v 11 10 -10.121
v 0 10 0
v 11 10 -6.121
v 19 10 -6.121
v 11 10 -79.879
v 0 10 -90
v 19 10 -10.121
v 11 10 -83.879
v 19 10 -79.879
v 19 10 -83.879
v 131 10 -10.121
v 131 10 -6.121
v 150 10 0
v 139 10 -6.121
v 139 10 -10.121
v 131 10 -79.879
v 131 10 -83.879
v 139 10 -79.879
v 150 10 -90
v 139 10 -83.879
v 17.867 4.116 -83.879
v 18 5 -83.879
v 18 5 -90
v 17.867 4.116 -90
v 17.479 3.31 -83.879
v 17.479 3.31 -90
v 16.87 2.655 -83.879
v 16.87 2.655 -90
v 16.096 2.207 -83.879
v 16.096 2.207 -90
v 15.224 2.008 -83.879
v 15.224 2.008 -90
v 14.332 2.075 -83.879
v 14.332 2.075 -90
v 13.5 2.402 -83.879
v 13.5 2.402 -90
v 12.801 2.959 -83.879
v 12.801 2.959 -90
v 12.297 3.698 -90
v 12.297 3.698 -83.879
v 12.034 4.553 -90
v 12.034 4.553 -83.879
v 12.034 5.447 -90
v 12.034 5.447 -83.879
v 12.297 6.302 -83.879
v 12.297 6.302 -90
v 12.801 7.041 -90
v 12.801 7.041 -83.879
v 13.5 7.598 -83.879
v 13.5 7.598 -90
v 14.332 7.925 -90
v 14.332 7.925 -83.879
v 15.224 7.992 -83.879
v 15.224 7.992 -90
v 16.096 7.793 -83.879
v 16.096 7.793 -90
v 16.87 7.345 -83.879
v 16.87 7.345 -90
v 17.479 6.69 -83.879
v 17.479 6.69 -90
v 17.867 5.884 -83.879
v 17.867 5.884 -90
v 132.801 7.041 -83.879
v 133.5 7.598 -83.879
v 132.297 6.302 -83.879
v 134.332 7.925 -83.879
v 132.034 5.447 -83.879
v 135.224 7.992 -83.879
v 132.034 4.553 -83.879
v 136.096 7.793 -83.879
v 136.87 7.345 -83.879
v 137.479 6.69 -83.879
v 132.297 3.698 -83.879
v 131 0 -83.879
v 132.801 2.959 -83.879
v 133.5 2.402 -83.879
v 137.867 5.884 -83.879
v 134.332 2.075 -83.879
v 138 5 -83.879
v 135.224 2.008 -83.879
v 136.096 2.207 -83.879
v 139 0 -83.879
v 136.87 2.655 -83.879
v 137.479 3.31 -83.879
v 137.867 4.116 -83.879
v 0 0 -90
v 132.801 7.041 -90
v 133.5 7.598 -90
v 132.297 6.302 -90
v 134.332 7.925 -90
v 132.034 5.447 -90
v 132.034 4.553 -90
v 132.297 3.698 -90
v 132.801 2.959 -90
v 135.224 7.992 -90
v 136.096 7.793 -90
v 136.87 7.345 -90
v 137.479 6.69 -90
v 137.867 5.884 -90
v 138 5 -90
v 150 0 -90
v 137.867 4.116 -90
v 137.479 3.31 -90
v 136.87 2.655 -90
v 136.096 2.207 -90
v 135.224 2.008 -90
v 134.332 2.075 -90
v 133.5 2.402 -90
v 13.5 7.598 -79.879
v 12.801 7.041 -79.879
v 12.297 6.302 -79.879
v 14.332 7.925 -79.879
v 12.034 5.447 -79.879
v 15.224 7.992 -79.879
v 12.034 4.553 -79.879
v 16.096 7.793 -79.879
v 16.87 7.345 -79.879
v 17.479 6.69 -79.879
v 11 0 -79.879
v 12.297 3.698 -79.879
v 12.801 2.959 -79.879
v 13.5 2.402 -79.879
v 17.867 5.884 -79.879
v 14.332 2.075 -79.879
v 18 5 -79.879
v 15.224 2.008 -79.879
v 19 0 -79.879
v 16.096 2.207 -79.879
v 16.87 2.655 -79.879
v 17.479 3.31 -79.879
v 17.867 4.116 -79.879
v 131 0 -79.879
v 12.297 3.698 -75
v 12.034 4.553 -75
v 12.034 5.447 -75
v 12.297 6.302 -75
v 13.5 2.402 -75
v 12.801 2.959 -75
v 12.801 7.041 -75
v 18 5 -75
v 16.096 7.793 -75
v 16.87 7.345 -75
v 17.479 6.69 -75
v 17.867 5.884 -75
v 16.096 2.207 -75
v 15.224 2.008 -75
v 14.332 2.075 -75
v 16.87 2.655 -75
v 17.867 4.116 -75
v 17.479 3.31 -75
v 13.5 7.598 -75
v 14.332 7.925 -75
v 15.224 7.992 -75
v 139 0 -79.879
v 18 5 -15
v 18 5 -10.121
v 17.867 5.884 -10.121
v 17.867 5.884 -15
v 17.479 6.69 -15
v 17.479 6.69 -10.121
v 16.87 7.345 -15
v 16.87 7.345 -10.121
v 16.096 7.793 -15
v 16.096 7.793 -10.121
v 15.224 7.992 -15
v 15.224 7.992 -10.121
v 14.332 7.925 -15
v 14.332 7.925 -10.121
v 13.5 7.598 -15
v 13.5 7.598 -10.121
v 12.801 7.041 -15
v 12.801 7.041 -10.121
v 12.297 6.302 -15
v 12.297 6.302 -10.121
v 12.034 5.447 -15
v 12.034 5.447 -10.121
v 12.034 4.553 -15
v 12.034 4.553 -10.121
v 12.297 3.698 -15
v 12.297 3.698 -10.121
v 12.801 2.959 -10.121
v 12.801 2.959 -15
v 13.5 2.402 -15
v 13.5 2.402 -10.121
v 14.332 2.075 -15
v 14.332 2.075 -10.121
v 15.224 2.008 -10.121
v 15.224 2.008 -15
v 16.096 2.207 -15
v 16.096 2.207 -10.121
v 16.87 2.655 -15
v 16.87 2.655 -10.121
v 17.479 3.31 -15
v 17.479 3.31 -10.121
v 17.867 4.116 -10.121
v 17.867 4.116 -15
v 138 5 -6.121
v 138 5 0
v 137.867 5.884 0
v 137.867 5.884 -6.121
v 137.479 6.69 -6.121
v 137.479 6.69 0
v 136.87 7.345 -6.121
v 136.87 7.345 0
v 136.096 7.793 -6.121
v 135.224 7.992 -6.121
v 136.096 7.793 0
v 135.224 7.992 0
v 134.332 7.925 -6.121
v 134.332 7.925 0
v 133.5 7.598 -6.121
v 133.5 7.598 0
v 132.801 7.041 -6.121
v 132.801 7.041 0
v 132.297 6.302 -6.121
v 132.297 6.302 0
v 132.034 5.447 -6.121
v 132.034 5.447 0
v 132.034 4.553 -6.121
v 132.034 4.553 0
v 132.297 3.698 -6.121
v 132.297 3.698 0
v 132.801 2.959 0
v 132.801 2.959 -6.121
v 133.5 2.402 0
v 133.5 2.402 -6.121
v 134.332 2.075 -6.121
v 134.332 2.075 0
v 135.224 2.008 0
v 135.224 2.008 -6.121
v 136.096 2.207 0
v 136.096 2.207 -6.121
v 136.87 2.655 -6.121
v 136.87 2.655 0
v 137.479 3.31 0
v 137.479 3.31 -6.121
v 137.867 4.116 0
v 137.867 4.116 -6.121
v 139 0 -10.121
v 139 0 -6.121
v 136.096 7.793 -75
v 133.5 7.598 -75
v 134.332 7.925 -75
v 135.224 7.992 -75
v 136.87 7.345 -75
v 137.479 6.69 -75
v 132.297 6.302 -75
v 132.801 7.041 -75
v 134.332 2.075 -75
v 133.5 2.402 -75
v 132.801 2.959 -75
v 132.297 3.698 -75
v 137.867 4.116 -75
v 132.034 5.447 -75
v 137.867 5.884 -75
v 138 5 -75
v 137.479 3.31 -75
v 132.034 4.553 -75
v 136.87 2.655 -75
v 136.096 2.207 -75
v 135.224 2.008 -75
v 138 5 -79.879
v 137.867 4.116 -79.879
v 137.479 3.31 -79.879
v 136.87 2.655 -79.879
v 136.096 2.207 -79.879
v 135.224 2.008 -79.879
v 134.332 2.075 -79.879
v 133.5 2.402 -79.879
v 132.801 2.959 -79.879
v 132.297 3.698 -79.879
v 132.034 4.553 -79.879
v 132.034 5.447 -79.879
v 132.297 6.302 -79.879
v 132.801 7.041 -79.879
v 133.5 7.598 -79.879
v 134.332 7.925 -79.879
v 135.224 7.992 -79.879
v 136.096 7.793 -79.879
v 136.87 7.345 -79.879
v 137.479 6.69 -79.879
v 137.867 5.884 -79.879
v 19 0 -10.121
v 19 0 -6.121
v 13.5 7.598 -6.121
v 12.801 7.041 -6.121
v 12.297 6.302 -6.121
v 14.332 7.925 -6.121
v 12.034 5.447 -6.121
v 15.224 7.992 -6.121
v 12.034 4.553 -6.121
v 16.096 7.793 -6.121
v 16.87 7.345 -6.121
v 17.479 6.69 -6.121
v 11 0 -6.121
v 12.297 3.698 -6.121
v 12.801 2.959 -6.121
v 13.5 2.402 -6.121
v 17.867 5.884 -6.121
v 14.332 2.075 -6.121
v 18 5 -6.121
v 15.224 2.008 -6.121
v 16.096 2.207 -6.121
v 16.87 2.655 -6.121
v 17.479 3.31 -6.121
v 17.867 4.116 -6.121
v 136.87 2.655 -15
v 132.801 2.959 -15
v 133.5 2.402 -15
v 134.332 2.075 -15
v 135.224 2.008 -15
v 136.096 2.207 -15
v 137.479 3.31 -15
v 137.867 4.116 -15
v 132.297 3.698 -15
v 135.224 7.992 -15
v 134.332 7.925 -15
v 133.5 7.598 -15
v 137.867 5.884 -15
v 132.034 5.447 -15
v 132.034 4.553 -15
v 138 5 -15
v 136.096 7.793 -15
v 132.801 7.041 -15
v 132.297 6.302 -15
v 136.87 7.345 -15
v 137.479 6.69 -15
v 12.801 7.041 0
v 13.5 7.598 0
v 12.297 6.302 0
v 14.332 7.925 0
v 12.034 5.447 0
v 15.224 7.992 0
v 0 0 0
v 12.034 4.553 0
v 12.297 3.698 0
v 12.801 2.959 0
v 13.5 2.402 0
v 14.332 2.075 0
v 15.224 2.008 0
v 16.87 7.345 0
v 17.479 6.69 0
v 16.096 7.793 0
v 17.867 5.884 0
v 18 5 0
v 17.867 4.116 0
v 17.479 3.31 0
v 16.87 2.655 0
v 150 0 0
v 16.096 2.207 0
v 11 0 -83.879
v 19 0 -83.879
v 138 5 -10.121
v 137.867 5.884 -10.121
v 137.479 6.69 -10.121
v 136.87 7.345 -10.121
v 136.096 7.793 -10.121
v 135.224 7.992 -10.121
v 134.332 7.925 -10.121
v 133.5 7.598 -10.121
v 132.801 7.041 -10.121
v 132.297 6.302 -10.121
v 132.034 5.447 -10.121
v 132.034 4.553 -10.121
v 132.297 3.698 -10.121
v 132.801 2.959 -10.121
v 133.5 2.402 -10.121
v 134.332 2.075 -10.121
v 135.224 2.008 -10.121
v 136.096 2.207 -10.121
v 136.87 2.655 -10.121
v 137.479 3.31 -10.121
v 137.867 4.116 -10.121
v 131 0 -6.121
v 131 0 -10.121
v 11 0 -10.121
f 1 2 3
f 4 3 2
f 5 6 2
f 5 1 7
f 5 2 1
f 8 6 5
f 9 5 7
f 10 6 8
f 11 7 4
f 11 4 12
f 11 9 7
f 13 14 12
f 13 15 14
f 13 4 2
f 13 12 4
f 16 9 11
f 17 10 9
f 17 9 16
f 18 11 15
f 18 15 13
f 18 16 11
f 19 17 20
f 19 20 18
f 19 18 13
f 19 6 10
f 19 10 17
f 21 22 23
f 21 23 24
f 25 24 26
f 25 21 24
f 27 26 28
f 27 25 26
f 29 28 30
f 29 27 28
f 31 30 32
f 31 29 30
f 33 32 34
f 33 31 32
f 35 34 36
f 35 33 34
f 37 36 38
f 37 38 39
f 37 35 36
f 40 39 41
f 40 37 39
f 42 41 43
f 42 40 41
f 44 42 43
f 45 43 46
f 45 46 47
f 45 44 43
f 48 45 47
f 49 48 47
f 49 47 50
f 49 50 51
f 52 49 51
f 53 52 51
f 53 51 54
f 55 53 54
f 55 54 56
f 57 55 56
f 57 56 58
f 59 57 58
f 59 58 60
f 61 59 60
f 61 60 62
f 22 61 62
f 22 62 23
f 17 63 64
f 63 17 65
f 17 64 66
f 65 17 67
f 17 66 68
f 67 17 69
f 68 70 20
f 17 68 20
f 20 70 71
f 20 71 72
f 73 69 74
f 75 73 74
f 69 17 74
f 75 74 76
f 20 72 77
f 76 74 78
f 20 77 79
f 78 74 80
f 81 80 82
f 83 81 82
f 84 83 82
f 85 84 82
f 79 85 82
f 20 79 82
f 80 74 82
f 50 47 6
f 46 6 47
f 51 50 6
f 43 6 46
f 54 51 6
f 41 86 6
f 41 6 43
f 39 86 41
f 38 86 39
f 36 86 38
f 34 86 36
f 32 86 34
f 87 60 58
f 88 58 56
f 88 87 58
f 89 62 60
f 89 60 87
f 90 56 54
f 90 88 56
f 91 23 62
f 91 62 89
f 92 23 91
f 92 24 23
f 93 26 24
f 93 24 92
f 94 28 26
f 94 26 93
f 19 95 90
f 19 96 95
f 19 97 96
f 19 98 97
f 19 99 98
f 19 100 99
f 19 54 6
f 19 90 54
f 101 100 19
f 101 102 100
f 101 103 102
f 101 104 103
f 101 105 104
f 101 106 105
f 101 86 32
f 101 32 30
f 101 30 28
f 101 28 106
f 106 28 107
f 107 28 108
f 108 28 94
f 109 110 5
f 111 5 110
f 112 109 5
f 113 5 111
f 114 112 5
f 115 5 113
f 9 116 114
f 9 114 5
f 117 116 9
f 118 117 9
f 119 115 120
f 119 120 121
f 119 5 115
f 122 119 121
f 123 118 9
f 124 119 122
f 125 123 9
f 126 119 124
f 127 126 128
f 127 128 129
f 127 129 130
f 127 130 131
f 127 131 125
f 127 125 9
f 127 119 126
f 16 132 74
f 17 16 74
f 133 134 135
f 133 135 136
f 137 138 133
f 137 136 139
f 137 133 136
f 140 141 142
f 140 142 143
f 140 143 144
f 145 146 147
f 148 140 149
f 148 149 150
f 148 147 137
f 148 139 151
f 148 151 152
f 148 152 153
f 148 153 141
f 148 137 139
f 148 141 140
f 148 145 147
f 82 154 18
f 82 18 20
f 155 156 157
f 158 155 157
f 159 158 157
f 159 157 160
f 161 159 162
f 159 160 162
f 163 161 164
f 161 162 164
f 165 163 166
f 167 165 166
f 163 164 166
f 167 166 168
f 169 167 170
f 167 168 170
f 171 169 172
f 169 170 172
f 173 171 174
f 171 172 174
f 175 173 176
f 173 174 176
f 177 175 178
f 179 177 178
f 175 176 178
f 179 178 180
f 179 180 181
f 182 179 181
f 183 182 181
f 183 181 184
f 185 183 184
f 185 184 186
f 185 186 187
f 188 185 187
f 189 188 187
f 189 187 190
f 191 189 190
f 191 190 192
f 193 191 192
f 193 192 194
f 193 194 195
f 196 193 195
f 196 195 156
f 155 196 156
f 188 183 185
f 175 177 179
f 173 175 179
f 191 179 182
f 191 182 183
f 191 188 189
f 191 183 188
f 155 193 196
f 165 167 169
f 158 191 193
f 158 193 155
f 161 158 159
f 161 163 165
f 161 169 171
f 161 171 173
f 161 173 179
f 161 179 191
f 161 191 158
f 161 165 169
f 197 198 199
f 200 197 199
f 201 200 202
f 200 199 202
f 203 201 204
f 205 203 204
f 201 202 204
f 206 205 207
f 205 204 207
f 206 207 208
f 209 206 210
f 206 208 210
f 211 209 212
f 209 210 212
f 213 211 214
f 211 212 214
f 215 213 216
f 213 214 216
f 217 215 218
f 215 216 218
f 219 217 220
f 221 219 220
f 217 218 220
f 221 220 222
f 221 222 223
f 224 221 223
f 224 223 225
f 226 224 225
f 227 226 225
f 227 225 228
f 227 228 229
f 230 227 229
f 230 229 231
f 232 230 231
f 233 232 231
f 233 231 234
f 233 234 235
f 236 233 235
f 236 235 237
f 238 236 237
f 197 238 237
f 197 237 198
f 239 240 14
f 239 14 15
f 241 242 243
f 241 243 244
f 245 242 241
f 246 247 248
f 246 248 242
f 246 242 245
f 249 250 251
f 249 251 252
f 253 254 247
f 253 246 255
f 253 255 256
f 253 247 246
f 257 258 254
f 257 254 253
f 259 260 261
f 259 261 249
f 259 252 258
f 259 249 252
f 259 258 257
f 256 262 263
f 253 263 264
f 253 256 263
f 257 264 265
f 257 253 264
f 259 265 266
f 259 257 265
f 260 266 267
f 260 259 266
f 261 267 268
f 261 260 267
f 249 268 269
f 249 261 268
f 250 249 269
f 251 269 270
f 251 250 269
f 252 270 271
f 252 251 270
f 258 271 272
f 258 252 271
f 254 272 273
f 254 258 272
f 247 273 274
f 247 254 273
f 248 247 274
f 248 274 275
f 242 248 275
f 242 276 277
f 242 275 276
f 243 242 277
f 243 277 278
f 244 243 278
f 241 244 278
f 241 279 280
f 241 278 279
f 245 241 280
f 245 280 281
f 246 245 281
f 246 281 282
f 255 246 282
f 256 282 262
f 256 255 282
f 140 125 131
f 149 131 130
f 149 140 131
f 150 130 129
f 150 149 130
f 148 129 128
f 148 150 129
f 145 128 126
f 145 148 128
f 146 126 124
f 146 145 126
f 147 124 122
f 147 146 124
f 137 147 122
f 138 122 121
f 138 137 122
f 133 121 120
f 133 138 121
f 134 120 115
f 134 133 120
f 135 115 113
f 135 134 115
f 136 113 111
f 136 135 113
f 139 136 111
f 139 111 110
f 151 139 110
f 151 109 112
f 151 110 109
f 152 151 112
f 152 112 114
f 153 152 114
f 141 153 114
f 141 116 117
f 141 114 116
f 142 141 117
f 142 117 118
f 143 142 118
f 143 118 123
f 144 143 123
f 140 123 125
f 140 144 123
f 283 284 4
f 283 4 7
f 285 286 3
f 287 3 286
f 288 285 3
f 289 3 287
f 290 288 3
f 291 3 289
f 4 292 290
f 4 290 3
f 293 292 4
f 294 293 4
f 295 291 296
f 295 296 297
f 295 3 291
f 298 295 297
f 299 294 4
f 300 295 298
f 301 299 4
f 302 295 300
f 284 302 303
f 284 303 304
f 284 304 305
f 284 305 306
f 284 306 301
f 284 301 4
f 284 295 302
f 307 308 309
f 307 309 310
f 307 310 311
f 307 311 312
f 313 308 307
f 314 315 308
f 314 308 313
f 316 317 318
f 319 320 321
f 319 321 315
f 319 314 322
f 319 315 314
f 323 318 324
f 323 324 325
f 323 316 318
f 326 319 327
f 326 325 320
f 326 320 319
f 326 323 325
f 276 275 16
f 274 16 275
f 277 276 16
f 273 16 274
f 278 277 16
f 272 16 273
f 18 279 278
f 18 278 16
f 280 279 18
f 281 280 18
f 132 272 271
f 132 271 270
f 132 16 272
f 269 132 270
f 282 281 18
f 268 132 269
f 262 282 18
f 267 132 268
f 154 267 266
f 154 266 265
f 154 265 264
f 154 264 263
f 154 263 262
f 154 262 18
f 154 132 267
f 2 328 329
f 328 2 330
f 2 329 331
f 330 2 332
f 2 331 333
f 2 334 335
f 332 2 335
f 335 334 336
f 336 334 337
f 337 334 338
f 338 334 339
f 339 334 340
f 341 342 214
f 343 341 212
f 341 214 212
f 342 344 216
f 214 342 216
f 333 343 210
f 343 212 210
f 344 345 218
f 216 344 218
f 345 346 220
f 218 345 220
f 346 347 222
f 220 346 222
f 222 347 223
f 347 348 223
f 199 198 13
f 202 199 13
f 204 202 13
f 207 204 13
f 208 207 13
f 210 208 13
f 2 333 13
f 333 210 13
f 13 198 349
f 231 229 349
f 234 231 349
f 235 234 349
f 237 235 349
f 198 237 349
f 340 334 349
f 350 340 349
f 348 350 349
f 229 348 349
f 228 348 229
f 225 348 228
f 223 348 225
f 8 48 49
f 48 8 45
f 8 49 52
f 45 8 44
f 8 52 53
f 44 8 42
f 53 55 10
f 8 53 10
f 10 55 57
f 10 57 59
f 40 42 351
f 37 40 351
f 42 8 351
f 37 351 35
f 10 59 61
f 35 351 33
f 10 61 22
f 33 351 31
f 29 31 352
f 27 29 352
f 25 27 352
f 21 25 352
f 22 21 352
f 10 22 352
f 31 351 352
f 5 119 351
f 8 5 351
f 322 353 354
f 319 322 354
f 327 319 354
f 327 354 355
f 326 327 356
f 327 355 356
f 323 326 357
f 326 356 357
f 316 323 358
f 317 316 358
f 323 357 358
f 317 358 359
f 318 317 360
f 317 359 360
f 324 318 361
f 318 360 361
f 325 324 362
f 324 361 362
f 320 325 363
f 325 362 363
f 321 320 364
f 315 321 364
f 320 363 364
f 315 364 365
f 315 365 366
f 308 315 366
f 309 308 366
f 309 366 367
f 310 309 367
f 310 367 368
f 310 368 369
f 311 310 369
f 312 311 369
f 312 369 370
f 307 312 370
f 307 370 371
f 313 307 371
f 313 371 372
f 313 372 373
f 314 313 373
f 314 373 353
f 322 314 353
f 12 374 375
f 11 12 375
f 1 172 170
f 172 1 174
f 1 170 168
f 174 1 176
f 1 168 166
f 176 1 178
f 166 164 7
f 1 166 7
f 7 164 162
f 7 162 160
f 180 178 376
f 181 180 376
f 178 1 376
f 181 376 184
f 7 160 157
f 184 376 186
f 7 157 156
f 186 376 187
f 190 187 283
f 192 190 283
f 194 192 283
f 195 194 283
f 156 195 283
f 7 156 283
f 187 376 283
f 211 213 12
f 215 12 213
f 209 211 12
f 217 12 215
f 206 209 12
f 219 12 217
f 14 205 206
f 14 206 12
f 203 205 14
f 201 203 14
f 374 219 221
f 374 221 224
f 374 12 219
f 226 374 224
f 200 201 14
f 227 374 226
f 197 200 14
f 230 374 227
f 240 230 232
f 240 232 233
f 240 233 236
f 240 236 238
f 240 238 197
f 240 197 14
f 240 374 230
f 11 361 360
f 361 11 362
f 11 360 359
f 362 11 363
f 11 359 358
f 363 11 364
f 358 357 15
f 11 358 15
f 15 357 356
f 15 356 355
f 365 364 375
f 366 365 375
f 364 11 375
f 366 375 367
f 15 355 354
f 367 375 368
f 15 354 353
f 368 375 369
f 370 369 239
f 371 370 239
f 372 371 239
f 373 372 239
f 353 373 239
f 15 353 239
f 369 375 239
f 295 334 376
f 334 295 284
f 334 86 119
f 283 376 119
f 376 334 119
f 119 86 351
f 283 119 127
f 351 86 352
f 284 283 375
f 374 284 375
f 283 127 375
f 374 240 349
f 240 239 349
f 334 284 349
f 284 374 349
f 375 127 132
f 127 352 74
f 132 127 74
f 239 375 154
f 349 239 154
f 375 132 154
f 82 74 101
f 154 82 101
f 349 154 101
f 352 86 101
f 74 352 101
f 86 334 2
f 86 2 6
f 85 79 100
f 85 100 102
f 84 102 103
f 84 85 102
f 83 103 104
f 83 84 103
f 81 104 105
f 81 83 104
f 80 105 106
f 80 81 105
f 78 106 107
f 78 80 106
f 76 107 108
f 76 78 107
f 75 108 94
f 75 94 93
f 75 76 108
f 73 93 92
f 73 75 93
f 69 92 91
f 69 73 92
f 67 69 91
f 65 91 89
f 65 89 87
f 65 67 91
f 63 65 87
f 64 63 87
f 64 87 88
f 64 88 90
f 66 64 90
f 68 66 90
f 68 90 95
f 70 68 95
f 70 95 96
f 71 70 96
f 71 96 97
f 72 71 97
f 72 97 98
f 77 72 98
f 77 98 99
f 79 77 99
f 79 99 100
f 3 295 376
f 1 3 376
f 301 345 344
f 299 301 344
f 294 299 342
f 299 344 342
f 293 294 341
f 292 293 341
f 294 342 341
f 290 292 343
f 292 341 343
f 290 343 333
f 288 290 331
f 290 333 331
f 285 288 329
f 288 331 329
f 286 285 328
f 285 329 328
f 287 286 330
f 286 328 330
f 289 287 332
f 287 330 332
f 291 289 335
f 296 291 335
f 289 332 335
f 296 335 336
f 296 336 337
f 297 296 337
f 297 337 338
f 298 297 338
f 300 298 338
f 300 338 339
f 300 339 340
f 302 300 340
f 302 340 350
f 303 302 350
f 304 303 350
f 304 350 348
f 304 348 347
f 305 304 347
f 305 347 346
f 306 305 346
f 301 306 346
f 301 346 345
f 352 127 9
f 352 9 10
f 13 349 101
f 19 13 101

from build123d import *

# Parameters (mm, degrees)
SKETCH1_W           = 150
SKETCH1_H           = 90
SKETCH1_W_2         = 8
SKETCH1_H_2         = 4
BOSS_EXTRUDE1_DEPTH = 10
SKETCH3_R           = 3
CUT_EXTRUDE1_DEPTH  = 15
CUT_EXTRUDE2_START  = -15
SKETCH4_R           = 3
CUT_EXTRUDE2_DEPTH  = 15


with BuildPart() as part:
    # Sketch1 → Boss-Extrude1 (new body)
    with BuildSketch(Plane(origin=(0, 0, 0), x_dir=(1, 0, 0), z_dir=(0, 1, 0))):
        with Locations((75, 45)):
            Rectangle(SKETCH1_W, SKETCH1_H)
        with Locations((135, 8.120559305)):
            Rectangle(SKETCH1_W_2, SKETCH1_H_2, mode=Mode.SUBTRACT)
        with Locations((15, 81.879440695)):
            Rectangle(SKETCH1_W_2, SKETCH1_H_2, mode=Mode.SUBTRACT)
        with Locations((135, 81.879440695)):
            Rectangle(SKETCH1_W_2, SKETCH1_H_2, mode=Mode.SUBTRACT)
        with Locations((15, 8.120559305)):
            Rectangle(SKETCH1_W_2, SKETCH1_H_2, mode=Mode.SUBTRACT)
    extrude(amount=BOSS_EXTRUDE1_DEPTH)

    # Sketch3 → Cut-Extrude1 (cut)
    with BuildSketch(Plane.XY):
        with Locations((15, 5)):
            Circle(SKETCH3_R)
        with Locations((135, 5)):
            Circle(SKETCH3_R)
    extrude(amount=-CUT_EXTRUDE1_DEPTH, mode=Mode.SUBTRACT)

    # Sketch4 → Cut-Extrude2 (cut)
    with BuildSketch(Plane(origin=(0, 0, -90), x_dir=(-1, 0, 0), z_dir=(0, 0, -1)).offset(CUT_EXTRUDE2_START)):
        with Locations(Location((-15, 5, 0), (0, 0, 180))):
            Circle(SKETCH4_R)
        with Locations(Location((-135, 5, 0), (0, 0, 180))):
            Circle(SKETCH4_R)
    extrude(amount=CUT_EXTRUDE2_DEPTH, mode=Mode.SUBTRACT)


solid = part.part
